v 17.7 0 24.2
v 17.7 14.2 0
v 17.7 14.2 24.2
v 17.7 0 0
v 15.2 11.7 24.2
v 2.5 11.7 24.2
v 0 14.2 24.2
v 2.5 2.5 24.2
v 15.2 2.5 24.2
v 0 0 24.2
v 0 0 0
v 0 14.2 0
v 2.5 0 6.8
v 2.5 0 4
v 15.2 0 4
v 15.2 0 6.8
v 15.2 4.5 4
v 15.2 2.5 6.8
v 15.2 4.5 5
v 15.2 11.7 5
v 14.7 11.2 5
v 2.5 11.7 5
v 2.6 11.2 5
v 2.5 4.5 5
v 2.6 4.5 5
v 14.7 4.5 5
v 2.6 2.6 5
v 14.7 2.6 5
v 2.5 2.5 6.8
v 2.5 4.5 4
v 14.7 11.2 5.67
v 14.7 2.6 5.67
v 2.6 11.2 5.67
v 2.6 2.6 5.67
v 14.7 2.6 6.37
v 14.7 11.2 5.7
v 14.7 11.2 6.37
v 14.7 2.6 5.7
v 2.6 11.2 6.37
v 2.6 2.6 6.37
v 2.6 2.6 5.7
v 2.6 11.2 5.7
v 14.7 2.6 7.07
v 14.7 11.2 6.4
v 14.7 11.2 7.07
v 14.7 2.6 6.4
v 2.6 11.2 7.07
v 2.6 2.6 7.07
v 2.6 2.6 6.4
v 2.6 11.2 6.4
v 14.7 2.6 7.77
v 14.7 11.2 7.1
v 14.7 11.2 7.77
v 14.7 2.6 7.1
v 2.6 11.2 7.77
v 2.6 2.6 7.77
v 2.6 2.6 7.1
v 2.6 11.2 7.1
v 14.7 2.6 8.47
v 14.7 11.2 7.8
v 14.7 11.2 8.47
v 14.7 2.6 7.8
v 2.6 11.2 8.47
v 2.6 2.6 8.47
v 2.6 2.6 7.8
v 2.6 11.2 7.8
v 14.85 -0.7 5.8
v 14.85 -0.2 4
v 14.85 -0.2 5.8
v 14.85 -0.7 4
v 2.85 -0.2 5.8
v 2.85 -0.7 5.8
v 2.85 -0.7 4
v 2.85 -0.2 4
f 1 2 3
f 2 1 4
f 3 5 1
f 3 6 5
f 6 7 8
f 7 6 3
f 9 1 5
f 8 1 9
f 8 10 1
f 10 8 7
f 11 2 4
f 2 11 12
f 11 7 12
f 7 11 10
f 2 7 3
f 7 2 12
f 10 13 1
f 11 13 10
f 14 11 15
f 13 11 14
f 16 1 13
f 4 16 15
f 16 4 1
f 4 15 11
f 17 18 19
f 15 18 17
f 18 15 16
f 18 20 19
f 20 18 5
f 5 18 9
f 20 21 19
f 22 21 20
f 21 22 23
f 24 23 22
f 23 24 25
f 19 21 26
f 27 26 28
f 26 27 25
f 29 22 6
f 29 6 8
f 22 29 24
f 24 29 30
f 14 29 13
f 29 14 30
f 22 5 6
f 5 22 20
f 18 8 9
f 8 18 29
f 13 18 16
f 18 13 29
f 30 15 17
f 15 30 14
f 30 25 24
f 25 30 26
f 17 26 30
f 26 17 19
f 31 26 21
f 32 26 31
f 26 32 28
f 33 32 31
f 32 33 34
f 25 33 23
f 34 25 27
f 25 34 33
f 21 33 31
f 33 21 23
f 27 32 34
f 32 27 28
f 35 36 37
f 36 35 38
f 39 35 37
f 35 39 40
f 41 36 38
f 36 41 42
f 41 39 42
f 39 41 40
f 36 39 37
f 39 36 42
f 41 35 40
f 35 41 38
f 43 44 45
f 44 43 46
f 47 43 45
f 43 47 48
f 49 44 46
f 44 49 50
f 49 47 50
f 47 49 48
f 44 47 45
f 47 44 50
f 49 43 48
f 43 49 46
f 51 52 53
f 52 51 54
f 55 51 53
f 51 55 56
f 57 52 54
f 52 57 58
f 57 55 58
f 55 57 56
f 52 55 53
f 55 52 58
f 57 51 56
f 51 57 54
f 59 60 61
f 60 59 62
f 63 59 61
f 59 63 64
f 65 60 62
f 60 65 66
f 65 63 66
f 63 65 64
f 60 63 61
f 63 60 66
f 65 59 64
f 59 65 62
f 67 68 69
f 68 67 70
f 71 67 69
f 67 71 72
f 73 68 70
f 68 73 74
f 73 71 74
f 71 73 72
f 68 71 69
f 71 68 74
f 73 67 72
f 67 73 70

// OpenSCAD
// Nano-SIM gravity tube - parametric
// Units: mm
$fn = 64;

// Nano-SIM dimensions
card_w = 12.3;    // longer side
card_d = 8.8;     // short side
card_t = 0.67;

clearance_side = 0.2;    // each side
inner_w = card_w + 2 * clearance_side; // 12.7
inner_d = card_d + 2 * clearance_side; // 9.2

wall = 2.5;
slot_h = 0.8;   // slot height
pusher_thk = 0.5; // pusher thickness
pusher_width = inner_w - 0.7; // pusher width
stroke = card_d + 1.0; // push distance

// Stack height calculation
N_CARDS = 10; // Number of cards to store
stack_h = N_CARDS * card_t + 5; // small inter-card gap + headroom

// Body
translate([0, 0, 0])
difference() {
    // Outer box
    translate([0, 0, 0])
        cube([inner_w + 2 * wall, inner_d + 2 * wall, stack_h + wall + 10], center=false);

    // Internal cavity
    translate([wall, wall, 5])
        cube([inner_w, inner_d, stack_h], center=false);

    // Bottom slot cutout (on front face)
    translate([wall, -1, 4]) {
        cube([inner_w, 3 + wall, slot_h + 2], center=false);
    }

    // Top opening (for loading)
    translate([wall, wall, stack_h + 5])
        cube([inner_w, inner_d, 20], center=false);
}

// Pusher (visual)
translate([wall + (inner_w - pusher_width) / 2, - (pusher_thk + 0.2), 4])
    cube([pusher_width, pusher_thk, slot_h + 1], center=false);

// Optional: show a few cards in stack for scale
for (i = [0:4]) {
    translate([wall + 0.1, wall + 0.1, 5 + i * (card_t + 0.03)])
        cube([card_w - 0.2, card_d - 0.2, card_t], center=false);
}
